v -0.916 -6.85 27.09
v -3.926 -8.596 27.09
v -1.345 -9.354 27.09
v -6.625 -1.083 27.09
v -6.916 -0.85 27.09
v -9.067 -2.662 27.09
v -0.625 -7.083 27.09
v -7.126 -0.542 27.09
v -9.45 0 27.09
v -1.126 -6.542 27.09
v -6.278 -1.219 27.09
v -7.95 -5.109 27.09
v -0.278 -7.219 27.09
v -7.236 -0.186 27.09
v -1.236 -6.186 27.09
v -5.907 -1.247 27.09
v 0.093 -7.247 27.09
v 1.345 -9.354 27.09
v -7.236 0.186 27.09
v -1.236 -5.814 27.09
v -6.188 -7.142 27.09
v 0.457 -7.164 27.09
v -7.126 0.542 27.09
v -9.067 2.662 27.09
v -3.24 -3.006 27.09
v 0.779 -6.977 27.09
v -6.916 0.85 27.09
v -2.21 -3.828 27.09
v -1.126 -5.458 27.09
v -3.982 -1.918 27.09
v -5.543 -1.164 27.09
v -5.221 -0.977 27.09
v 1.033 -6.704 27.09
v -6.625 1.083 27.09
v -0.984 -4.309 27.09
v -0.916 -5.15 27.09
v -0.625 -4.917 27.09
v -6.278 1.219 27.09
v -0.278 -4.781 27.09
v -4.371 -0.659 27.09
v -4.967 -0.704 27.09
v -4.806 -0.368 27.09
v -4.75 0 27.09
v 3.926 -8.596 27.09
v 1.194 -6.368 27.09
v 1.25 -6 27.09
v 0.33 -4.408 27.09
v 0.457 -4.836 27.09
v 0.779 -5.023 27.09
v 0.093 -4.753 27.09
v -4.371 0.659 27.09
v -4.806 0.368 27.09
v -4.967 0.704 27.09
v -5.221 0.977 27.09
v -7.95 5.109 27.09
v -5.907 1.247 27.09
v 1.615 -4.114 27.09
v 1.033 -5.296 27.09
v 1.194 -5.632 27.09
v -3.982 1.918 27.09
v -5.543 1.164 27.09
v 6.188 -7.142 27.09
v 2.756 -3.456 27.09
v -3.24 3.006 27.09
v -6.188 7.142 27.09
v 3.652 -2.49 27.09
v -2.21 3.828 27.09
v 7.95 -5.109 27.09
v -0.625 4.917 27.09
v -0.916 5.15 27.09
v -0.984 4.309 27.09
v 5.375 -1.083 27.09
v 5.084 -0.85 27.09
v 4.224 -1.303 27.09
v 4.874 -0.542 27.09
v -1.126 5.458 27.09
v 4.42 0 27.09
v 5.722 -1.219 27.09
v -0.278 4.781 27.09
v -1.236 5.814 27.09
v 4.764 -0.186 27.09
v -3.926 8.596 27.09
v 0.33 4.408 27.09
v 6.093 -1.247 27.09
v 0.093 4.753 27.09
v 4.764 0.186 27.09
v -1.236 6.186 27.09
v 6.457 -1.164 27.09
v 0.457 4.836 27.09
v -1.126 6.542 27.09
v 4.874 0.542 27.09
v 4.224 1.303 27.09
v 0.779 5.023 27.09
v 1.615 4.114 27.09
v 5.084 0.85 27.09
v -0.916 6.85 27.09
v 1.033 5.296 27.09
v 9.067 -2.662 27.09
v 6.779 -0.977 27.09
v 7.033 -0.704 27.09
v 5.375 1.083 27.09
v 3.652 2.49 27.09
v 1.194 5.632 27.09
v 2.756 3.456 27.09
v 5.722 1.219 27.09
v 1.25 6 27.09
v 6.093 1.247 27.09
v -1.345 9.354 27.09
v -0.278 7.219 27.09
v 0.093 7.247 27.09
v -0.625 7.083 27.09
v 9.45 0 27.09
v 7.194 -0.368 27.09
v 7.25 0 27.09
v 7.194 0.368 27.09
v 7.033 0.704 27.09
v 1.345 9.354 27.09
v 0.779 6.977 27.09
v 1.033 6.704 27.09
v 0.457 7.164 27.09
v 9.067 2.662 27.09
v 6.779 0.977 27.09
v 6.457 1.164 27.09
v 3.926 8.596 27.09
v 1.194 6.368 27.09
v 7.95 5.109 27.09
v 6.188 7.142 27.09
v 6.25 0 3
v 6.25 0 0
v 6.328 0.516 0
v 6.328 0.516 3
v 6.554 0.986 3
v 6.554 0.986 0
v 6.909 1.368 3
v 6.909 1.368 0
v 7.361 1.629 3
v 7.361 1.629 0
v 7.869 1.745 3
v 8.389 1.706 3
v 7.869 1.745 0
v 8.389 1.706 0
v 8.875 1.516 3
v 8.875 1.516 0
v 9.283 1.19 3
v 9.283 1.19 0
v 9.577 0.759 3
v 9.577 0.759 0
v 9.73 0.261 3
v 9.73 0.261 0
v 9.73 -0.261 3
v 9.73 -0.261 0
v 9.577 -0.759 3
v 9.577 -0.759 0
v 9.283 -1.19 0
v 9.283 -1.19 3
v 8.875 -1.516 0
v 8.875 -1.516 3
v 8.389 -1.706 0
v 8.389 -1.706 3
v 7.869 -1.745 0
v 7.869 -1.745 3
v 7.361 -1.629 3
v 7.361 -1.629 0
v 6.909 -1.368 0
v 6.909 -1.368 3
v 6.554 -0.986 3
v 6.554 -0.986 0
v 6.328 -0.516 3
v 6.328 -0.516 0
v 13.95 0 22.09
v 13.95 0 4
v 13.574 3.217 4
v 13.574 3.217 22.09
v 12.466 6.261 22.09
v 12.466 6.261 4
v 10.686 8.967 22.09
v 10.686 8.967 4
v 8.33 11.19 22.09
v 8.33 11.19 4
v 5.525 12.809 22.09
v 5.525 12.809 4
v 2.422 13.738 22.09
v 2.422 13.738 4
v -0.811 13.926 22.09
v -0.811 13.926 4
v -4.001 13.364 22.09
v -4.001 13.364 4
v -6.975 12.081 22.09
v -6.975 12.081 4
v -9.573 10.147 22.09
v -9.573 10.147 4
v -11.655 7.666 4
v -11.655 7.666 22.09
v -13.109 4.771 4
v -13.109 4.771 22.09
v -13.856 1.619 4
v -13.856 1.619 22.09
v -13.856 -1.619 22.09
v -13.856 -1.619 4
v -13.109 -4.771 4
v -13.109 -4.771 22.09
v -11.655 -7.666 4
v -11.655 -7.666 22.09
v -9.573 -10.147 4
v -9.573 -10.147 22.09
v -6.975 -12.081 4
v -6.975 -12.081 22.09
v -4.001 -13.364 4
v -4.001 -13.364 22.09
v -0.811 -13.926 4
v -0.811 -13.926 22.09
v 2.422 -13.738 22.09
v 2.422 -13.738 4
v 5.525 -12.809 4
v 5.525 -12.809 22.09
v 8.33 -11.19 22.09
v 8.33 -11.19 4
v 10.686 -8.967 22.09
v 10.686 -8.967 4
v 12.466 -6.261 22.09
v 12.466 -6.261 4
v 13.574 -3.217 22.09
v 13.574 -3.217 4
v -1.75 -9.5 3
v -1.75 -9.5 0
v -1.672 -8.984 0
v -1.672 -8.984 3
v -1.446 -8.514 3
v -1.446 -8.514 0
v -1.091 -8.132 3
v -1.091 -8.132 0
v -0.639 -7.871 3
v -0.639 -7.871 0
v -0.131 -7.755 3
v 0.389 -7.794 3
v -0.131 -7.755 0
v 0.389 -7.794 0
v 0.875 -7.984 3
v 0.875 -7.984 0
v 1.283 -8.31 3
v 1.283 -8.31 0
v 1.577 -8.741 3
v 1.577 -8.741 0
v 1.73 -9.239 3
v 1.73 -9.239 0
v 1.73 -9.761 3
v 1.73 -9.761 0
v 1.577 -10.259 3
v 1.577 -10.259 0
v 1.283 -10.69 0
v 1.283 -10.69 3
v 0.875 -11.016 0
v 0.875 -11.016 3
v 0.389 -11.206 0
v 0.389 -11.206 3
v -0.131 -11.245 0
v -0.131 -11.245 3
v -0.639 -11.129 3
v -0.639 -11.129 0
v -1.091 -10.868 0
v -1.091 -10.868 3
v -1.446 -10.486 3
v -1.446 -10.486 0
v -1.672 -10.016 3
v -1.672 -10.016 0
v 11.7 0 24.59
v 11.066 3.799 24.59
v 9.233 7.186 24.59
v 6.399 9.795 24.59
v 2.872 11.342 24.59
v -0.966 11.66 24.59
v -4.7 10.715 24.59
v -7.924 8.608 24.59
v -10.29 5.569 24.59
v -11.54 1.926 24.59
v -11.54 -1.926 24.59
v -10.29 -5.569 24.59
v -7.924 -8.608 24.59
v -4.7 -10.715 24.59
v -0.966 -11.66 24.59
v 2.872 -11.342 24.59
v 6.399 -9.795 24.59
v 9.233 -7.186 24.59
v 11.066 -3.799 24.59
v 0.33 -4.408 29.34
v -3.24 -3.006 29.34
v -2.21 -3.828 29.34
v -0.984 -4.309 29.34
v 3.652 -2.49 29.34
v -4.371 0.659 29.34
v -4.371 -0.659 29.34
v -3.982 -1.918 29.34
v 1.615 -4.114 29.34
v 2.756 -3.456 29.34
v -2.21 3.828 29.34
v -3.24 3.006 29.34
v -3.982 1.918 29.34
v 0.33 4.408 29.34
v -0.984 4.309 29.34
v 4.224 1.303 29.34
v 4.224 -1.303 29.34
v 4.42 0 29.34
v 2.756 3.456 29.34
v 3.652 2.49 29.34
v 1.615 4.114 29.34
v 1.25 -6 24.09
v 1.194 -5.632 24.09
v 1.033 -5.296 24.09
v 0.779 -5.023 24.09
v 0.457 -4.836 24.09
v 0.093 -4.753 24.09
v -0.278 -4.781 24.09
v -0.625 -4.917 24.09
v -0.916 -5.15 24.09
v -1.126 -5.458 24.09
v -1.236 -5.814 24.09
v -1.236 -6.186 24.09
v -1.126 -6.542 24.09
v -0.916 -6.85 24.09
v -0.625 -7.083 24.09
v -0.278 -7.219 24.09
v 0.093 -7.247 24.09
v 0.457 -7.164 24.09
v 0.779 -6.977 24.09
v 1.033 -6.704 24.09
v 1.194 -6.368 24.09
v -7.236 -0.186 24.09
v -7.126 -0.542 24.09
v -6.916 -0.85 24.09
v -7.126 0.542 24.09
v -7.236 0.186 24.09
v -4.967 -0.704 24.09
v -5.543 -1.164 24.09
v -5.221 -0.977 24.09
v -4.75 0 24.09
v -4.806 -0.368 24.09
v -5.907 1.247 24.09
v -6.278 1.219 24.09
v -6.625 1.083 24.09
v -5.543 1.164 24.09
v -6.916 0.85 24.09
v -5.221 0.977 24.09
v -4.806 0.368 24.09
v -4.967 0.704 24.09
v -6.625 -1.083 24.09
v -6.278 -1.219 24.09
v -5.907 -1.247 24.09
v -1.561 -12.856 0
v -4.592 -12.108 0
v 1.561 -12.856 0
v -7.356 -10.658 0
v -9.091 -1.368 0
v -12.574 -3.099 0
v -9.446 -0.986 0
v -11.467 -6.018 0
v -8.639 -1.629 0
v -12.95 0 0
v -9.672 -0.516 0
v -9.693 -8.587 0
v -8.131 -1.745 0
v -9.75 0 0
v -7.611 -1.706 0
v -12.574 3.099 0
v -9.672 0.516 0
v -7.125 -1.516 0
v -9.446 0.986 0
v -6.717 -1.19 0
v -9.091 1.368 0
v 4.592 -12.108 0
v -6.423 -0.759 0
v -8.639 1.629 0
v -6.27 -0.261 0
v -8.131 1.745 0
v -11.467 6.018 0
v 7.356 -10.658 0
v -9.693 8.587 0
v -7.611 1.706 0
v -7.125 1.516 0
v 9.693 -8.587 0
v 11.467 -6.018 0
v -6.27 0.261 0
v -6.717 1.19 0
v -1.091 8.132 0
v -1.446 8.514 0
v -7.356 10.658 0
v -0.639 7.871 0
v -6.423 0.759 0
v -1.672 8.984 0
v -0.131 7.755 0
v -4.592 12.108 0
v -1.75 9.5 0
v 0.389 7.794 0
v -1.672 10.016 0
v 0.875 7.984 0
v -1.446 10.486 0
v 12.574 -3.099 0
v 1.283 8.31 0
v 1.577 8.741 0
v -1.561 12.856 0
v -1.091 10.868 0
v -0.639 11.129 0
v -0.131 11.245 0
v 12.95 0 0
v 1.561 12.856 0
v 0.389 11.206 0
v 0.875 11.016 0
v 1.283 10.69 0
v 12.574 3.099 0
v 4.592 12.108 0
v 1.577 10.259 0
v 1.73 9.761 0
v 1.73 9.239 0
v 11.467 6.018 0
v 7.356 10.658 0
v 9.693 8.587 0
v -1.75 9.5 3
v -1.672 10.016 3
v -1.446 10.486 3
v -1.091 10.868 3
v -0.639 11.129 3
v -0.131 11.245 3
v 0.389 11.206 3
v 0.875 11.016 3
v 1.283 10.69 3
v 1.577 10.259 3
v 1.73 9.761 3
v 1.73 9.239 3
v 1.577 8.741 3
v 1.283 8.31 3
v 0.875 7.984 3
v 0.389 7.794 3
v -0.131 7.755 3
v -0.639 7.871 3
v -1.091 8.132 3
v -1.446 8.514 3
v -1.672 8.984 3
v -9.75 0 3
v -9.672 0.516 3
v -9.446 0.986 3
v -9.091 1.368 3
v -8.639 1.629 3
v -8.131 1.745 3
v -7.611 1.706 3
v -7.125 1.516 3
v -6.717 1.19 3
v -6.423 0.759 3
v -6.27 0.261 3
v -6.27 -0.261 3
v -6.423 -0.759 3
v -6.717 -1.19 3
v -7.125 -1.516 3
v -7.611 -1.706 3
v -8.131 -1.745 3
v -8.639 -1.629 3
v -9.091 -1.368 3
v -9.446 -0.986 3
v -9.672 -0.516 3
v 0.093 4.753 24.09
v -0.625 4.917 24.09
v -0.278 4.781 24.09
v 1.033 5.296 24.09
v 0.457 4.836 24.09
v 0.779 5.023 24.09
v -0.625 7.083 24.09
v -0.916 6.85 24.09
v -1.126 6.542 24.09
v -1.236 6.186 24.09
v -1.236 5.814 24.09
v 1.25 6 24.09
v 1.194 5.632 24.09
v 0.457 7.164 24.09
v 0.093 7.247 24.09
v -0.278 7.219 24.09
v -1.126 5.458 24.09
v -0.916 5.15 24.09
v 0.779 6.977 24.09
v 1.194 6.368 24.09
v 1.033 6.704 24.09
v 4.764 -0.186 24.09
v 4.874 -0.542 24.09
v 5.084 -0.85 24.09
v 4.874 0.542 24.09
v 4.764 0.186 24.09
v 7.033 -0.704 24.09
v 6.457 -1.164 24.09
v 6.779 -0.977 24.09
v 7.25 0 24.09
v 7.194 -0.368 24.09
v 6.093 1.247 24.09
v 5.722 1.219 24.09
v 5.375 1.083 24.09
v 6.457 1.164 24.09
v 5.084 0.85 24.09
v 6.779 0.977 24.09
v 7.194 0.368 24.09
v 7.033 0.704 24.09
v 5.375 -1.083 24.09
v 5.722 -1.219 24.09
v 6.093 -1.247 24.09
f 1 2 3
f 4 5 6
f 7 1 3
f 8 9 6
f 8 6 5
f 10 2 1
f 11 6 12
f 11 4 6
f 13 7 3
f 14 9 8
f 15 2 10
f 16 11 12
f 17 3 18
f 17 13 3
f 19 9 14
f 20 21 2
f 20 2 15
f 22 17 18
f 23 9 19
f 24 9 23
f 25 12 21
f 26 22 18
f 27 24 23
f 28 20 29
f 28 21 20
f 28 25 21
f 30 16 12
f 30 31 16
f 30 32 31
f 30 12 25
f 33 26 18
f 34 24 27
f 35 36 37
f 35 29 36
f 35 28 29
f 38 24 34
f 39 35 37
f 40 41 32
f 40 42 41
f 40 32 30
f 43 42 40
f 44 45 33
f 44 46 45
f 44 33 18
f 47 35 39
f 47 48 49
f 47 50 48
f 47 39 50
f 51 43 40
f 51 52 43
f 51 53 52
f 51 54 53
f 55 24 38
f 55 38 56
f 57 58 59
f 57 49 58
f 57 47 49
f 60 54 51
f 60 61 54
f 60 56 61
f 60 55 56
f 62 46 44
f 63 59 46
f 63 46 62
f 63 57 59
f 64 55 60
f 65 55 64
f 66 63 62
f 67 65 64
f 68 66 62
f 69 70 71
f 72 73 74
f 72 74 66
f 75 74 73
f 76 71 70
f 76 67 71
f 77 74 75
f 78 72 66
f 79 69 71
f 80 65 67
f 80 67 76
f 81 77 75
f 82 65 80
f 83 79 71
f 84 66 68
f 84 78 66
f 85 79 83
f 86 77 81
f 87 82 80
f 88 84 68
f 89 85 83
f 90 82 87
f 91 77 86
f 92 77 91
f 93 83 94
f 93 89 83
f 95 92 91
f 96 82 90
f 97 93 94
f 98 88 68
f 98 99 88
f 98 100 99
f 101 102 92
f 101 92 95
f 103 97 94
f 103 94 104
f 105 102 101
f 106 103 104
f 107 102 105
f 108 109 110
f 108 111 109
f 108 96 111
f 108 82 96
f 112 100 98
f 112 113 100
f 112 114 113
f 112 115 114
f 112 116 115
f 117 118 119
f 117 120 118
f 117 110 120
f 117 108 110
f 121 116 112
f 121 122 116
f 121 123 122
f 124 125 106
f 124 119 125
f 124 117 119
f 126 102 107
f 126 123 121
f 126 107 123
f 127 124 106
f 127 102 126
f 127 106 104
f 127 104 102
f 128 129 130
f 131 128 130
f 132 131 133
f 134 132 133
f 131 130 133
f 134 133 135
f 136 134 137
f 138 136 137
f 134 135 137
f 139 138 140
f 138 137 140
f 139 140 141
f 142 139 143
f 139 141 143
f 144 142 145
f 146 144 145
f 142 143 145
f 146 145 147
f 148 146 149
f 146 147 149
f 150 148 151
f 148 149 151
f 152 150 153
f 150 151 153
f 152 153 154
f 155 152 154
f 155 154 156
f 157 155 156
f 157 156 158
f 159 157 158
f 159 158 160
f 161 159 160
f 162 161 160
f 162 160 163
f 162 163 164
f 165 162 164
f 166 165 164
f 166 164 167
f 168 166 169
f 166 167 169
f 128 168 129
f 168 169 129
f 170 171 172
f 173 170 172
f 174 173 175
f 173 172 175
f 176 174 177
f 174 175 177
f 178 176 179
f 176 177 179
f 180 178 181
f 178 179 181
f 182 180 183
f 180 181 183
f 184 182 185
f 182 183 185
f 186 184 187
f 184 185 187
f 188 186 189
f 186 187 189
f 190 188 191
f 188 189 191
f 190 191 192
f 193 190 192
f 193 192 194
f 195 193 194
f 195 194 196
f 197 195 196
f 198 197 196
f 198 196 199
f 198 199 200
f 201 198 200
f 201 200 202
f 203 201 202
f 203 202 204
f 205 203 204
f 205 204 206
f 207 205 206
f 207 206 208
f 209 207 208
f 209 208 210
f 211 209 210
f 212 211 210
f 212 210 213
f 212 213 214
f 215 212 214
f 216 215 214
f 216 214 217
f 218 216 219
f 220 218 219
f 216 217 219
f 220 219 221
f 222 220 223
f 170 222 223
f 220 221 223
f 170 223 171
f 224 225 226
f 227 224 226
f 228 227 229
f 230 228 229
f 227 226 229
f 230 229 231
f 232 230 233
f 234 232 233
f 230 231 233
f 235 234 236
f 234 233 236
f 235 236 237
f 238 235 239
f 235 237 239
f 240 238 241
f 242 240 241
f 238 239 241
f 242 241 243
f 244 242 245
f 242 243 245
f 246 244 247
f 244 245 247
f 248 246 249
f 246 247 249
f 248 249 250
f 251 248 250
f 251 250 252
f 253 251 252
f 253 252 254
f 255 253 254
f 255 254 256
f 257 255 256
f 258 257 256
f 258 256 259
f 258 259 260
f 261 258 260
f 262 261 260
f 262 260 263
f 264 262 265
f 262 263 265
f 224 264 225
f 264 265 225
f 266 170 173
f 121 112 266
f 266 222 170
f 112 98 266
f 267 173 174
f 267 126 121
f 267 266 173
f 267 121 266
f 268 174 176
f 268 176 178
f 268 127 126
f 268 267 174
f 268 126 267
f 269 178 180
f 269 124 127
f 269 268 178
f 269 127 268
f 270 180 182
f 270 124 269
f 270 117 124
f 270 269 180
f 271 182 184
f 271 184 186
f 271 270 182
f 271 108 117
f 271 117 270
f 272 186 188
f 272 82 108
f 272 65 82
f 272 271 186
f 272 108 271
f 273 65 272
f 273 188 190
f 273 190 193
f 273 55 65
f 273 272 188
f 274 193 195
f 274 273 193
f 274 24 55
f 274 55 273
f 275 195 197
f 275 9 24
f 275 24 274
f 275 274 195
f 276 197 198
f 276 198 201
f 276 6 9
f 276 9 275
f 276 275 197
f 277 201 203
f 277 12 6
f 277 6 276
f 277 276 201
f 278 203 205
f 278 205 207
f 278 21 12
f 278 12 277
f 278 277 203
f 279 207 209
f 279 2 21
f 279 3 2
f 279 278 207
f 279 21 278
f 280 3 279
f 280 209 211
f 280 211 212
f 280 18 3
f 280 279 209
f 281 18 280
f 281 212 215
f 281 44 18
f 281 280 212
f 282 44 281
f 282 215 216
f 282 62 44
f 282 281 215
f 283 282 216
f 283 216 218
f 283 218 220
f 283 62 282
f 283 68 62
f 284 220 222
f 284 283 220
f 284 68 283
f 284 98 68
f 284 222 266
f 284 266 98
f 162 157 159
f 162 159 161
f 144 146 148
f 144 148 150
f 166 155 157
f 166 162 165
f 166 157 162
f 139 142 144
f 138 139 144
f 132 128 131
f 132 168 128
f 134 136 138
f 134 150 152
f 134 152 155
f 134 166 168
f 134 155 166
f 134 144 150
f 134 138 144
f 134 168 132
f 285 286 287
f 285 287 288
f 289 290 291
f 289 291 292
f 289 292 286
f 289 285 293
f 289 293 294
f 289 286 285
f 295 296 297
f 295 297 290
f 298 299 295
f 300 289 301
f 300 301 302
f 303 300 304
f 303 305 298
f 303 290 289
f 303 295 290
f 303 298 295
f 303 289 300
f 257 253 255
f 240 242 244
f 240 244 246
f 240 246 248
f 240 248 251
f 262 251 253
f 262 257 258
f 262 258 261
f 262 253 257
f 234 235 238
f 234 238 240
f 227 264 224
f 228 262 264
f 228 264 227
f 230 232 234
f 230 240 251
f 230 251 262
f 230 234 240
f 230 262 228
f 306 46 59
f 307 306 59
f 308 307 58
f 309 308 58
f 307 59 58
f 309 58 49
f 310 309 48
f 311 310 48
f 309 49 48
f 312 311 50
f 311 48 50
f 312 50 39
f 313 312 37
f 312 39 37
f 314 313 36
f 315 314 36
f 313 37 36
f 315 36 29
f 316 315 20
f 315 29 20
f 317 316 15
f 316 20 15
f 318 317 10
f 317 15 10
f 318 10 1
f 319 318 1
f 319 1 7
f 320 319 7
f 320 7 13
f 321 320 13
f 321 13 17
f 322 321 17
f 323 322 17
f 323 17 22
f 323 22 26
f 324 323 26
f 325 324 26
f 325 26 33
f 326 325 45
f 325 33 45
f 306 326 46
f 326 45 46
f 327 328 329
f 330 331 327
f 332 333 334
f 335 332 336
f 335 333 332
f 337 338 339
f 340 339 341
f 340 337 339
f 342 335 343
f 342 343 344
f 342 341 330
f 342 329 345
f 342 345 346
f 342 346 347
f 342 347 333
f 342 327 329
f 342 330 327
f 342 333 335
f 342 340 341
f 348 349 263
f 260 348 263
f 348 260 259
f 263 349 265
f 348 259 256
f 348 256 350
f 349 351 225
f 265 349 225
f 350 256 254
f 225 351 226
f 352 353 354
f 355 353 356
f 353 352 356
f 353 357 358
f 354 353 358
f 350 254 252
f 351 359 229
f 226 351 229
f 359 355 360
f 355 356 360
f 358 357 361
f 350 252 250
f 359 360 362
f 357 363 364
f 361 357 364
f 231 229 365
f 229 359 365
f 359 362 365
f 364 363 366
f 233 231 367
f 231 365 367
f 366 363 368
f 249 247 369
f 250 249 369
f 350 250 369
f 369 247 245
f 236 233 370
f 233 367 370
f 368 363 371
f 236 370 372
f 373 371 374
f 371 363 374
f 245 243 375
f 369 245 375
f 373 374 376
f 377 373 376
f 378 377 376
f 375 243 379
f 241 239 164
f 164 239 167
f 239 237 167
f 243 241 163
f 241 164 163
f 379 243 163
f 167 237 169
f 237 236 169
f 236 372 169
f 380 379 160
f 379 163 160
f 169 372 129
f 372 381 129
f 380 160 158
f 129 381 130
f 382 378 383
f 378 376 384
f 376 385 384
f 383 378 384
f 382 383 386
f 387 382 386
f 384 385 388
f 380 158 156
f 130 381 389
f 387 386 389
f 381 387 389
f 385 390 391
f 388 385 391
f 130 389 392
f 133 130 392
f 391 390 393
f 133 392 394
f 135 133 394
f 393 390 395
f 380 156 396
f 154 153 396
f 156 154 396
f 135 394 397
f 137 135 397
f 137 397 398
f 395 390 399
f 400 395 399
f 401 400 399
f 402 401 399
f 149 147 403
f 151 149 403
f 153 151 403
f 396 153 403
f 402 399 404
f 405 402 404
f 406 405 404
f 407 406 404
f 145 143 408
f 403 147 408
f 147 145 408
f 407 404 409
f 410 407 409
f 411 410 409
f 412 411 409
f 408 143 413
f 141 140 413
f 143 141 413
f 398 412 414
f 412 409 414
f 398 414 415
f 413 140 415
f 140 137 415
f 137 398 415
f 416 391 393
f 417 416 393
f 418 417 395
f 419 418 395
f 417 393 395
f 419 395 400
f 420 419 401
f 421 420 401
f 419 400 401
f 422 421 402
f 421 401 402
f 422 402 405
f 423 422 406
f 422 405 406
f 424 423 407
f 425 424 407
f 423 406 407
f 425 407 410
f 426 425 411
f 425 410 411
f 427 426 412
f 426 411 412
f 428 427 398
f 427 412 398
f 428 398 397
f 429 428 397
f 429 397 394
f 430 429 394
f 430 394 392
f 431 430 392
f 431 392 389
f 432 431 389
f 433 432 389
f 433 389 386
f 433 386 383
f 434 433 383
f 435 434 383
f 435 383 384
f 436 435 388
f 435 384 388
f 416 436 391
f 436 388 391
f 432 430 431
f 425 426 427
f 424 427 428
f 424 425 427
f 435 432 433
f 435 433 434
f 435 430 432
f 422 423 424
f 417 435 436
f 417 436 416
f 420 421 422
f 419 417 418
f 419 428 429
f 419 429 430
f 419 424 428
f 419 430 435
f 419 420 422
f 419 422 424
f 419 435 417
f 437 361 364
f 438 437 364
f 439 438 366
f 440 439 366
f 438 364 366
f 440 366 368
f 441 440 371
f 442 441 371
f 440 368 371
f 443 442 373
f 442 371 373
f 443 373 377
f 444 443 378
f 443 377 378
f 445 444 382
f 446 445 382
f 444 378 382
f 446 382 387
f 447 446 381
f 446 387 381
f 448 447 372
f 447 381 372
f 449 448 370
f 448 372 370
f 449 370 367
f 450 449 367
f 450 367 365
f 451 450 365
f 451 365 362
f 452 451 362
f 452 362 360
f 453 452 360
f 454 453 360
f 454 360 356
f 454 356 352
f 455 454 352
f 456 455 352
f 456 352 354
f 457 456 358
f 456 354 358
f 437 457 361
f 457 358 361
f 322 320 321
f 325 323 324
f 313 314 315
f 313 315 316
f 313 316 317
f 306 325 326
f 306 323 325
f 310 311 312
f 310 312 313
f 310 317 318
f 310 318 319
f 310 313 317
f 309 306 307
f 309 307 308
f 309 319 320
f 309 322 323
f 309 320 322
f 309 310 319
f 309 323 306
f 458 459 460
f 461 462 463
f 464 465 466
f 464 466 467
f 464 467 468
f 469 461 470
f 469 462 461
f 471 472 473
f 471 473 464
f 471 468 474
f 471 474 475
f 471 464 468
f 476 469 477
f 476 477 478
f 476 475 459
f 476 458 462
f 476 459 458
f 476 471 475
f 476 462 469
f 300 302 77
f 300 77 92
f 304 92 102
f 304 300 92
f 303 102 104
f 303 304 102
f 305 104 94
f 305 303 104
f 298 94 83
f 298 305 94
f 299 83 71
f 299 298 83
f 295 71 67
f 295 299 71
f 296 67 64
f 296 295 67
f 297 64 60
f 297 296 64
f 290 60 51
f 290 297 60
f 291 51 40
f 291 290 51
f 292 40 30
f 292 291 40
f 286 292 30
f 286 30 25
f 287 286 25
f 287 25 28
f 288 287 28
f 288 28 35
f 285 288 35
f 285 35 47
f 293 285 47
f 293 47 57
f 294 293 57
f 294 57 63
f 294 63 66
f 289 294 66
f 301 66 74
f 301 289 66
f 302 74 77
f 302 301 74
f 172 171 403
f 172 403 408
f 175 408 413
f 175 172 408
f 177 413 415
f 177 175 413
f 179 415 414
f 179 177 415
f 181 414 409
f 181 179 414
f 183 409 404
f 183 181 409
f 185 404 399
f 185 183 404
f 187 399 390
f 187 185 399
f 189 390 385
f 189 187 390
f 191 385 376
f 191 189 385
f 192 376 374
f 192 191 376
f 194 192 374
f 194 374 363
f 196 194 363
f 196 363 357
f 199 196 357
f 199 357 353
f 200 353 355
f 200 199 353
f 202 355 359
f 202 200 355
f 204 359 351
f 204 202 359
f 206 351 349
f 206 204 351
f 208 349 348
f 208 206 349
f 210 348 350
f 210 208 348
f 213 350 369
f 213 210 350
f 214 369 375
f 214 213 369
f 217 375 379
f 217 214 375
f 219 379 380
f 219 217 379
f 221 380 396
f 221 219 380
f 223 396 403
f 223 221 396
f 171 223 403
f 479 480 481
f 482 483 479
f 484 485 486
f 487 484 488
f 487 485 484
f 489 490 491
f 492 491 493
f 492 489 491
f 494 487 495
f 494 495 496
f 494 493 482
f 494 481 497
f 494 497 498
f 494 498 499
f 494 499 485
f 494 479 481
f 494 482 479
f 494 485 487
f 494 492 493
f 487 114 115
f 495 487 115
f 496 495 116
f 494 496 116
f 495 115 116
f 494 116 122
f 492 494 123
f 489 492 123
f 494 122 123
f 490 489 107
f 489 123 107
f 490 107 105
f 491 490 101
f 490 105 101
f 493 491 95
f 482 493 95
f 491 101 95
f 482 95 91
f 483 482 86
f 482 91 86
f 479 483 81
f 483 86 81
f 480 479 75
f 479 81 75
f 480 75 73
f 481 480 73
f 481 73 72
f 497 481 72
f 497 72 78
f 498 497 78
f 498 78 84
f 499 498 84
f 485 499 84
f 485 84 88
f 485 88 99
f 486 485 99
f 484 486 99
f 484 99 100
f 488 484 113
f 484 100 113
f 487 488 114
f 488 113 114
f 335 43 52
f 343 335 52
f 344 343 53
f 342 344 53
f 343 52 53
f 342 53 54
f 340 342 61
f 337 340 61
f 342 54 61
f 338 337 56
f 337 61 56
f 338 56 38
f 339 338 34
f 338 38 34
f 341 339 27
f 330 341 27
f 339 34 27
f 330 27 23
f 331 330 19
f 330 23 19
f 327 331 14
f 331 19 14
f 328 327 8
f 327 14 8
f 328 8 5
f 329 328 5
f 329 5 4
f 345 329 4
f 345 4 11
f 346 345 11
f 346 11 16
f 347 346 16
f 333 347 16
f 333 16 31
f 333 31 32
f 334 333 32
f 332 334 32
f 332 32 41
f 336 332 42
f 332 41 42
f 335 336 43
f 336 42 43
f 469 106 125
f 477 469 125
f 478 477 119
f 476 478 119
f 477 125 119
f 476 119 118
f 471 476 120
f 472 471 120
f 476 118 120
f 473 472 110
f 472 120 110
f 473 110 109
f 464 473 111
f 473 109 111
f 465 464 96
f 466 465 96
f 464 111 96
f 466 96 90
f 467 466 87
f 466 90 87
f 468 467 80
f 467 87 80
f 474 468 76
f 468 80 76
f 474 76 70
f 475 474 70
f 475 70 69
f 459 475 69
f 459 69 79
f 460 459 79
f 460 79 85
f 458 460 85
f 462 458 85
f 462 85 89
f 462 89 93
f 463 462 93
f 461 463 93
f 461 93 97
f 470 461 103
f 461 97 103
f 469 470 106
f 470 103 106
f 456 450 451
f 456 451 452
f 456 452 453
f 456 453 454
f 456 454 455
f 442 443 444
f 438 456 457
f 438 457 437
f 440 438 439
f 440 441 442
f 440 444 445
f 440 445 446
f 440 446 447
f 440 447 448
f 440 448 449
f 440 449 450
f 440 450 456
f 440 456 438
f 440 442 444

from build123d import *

# Parameters (mm, degrees)
SKETCH1_R           = 13.95
BOSS_EXTRUDE1_DEPTH = 29.34
SKETCH2_R           = 13.95
SKETCH2_R_2         = 4.42
CUT_EXTRUDE1_DEPTH  = 2.25
CHAMFER1_SIZE       = 5
CHAMFER1_SIZE2      = 4.5
CHAMFER2_SIZE       = 1
CHAMFER2_SIZE2      = 4
SKETCH3_R           = 1.75
CUT_EXTRUDE2_DEPTH  = 3
SKETCH4_R           = 1.25
CUT_EXTRUDE3_DEPTH  = 3


with BuildPart() as part:
    # Sketch1 → Boss-Extrude1 (new body)
    with BuildSketch(Plane.XY):
        Circle(SKETCH1_R)
    extrude(amount=BOSS_EXTRUDE1_DEPTH)

    # Sketch2 → Cut-Extrude1 (cut)
    with BuildSketch(Plane.XY.offset(29.34)):
        Circle(SKETCH2_R)
        Circle(SKETCH2_R_2, mode=Mode.SUBTRACT)
    extrude(amount=-CUT_EXTRUDE1_DEPTH, mode=Mode.SUBTRACT)

    # Chamfer1
    chamfer1_edges = [part.edges().sort_by_distance(p)[0] for p in [
        (-13.95, 0, 27.09),
    ]]
    chamfer1_side = [part.faces().sort_by_distance(p)[0] for p in [
        (-13.95, 0, 13.545),
    ]]
    chamfer(chamfer1_edges, length=CHAMFER1_SIZE, length2=CHAMFER1_SIZE2, reference=chamfer1_side[0])

    # Chamfer2
    chamfer2_edges = [part.edges().sort_by_distance(p)[0] for p in [
        (-13.95, 0, 0),
    ]]
    chamfer2_side = [part.faces().sort_by_distance(p)[0] for p in [
        (0, 0, 0),
    ]]
    chamfer(chamfer2_edges, length=CHAMFER2_SIZE, length2=CHAMFER2_SIZE2, reference=chamfer2_side[0])

    # Sketch3 → Cut-Extrude2 (cut)
    with BuildSketch(Plane(origin=(0, 0, 0), x_dir=(-1, 0, 0), z_dir=(0, 0, -1))):
        with Locations((8, 0)):
            Circle(SKETCH3_R)
        with Locations((-8, 0)):
            Circle(SKETCH3_R)
        with Locations((0, -9.5)):
            Circle(SKETCH3_R)
        with Locations((0, 9.5)):
            Circle(SKETCH3_R)
    extrude(amount=-CUT_EXTRUDE2_DEPTH, mode=Mode.SUBTRACT)

    # Sketch4 → Cut-Extrude3 (cut)
    with BuildSketch(Plane.XY.offset(27.09)):
        with Locations((0, 6)):
            Circle(SKETCH4_R)
        with Locations((6, 0)):
            Circle(SKETCH4_R)
        with Locations((0, -6)):
            Circle(SKETCH4_R)
        with Locations((-6, 0)):
            Circle(SKETCH4_R)
    extrude(amount=-CUT_EXTRUDE3_DEPTH, mode=Mode.SUBTRACT)


solid = part.part
